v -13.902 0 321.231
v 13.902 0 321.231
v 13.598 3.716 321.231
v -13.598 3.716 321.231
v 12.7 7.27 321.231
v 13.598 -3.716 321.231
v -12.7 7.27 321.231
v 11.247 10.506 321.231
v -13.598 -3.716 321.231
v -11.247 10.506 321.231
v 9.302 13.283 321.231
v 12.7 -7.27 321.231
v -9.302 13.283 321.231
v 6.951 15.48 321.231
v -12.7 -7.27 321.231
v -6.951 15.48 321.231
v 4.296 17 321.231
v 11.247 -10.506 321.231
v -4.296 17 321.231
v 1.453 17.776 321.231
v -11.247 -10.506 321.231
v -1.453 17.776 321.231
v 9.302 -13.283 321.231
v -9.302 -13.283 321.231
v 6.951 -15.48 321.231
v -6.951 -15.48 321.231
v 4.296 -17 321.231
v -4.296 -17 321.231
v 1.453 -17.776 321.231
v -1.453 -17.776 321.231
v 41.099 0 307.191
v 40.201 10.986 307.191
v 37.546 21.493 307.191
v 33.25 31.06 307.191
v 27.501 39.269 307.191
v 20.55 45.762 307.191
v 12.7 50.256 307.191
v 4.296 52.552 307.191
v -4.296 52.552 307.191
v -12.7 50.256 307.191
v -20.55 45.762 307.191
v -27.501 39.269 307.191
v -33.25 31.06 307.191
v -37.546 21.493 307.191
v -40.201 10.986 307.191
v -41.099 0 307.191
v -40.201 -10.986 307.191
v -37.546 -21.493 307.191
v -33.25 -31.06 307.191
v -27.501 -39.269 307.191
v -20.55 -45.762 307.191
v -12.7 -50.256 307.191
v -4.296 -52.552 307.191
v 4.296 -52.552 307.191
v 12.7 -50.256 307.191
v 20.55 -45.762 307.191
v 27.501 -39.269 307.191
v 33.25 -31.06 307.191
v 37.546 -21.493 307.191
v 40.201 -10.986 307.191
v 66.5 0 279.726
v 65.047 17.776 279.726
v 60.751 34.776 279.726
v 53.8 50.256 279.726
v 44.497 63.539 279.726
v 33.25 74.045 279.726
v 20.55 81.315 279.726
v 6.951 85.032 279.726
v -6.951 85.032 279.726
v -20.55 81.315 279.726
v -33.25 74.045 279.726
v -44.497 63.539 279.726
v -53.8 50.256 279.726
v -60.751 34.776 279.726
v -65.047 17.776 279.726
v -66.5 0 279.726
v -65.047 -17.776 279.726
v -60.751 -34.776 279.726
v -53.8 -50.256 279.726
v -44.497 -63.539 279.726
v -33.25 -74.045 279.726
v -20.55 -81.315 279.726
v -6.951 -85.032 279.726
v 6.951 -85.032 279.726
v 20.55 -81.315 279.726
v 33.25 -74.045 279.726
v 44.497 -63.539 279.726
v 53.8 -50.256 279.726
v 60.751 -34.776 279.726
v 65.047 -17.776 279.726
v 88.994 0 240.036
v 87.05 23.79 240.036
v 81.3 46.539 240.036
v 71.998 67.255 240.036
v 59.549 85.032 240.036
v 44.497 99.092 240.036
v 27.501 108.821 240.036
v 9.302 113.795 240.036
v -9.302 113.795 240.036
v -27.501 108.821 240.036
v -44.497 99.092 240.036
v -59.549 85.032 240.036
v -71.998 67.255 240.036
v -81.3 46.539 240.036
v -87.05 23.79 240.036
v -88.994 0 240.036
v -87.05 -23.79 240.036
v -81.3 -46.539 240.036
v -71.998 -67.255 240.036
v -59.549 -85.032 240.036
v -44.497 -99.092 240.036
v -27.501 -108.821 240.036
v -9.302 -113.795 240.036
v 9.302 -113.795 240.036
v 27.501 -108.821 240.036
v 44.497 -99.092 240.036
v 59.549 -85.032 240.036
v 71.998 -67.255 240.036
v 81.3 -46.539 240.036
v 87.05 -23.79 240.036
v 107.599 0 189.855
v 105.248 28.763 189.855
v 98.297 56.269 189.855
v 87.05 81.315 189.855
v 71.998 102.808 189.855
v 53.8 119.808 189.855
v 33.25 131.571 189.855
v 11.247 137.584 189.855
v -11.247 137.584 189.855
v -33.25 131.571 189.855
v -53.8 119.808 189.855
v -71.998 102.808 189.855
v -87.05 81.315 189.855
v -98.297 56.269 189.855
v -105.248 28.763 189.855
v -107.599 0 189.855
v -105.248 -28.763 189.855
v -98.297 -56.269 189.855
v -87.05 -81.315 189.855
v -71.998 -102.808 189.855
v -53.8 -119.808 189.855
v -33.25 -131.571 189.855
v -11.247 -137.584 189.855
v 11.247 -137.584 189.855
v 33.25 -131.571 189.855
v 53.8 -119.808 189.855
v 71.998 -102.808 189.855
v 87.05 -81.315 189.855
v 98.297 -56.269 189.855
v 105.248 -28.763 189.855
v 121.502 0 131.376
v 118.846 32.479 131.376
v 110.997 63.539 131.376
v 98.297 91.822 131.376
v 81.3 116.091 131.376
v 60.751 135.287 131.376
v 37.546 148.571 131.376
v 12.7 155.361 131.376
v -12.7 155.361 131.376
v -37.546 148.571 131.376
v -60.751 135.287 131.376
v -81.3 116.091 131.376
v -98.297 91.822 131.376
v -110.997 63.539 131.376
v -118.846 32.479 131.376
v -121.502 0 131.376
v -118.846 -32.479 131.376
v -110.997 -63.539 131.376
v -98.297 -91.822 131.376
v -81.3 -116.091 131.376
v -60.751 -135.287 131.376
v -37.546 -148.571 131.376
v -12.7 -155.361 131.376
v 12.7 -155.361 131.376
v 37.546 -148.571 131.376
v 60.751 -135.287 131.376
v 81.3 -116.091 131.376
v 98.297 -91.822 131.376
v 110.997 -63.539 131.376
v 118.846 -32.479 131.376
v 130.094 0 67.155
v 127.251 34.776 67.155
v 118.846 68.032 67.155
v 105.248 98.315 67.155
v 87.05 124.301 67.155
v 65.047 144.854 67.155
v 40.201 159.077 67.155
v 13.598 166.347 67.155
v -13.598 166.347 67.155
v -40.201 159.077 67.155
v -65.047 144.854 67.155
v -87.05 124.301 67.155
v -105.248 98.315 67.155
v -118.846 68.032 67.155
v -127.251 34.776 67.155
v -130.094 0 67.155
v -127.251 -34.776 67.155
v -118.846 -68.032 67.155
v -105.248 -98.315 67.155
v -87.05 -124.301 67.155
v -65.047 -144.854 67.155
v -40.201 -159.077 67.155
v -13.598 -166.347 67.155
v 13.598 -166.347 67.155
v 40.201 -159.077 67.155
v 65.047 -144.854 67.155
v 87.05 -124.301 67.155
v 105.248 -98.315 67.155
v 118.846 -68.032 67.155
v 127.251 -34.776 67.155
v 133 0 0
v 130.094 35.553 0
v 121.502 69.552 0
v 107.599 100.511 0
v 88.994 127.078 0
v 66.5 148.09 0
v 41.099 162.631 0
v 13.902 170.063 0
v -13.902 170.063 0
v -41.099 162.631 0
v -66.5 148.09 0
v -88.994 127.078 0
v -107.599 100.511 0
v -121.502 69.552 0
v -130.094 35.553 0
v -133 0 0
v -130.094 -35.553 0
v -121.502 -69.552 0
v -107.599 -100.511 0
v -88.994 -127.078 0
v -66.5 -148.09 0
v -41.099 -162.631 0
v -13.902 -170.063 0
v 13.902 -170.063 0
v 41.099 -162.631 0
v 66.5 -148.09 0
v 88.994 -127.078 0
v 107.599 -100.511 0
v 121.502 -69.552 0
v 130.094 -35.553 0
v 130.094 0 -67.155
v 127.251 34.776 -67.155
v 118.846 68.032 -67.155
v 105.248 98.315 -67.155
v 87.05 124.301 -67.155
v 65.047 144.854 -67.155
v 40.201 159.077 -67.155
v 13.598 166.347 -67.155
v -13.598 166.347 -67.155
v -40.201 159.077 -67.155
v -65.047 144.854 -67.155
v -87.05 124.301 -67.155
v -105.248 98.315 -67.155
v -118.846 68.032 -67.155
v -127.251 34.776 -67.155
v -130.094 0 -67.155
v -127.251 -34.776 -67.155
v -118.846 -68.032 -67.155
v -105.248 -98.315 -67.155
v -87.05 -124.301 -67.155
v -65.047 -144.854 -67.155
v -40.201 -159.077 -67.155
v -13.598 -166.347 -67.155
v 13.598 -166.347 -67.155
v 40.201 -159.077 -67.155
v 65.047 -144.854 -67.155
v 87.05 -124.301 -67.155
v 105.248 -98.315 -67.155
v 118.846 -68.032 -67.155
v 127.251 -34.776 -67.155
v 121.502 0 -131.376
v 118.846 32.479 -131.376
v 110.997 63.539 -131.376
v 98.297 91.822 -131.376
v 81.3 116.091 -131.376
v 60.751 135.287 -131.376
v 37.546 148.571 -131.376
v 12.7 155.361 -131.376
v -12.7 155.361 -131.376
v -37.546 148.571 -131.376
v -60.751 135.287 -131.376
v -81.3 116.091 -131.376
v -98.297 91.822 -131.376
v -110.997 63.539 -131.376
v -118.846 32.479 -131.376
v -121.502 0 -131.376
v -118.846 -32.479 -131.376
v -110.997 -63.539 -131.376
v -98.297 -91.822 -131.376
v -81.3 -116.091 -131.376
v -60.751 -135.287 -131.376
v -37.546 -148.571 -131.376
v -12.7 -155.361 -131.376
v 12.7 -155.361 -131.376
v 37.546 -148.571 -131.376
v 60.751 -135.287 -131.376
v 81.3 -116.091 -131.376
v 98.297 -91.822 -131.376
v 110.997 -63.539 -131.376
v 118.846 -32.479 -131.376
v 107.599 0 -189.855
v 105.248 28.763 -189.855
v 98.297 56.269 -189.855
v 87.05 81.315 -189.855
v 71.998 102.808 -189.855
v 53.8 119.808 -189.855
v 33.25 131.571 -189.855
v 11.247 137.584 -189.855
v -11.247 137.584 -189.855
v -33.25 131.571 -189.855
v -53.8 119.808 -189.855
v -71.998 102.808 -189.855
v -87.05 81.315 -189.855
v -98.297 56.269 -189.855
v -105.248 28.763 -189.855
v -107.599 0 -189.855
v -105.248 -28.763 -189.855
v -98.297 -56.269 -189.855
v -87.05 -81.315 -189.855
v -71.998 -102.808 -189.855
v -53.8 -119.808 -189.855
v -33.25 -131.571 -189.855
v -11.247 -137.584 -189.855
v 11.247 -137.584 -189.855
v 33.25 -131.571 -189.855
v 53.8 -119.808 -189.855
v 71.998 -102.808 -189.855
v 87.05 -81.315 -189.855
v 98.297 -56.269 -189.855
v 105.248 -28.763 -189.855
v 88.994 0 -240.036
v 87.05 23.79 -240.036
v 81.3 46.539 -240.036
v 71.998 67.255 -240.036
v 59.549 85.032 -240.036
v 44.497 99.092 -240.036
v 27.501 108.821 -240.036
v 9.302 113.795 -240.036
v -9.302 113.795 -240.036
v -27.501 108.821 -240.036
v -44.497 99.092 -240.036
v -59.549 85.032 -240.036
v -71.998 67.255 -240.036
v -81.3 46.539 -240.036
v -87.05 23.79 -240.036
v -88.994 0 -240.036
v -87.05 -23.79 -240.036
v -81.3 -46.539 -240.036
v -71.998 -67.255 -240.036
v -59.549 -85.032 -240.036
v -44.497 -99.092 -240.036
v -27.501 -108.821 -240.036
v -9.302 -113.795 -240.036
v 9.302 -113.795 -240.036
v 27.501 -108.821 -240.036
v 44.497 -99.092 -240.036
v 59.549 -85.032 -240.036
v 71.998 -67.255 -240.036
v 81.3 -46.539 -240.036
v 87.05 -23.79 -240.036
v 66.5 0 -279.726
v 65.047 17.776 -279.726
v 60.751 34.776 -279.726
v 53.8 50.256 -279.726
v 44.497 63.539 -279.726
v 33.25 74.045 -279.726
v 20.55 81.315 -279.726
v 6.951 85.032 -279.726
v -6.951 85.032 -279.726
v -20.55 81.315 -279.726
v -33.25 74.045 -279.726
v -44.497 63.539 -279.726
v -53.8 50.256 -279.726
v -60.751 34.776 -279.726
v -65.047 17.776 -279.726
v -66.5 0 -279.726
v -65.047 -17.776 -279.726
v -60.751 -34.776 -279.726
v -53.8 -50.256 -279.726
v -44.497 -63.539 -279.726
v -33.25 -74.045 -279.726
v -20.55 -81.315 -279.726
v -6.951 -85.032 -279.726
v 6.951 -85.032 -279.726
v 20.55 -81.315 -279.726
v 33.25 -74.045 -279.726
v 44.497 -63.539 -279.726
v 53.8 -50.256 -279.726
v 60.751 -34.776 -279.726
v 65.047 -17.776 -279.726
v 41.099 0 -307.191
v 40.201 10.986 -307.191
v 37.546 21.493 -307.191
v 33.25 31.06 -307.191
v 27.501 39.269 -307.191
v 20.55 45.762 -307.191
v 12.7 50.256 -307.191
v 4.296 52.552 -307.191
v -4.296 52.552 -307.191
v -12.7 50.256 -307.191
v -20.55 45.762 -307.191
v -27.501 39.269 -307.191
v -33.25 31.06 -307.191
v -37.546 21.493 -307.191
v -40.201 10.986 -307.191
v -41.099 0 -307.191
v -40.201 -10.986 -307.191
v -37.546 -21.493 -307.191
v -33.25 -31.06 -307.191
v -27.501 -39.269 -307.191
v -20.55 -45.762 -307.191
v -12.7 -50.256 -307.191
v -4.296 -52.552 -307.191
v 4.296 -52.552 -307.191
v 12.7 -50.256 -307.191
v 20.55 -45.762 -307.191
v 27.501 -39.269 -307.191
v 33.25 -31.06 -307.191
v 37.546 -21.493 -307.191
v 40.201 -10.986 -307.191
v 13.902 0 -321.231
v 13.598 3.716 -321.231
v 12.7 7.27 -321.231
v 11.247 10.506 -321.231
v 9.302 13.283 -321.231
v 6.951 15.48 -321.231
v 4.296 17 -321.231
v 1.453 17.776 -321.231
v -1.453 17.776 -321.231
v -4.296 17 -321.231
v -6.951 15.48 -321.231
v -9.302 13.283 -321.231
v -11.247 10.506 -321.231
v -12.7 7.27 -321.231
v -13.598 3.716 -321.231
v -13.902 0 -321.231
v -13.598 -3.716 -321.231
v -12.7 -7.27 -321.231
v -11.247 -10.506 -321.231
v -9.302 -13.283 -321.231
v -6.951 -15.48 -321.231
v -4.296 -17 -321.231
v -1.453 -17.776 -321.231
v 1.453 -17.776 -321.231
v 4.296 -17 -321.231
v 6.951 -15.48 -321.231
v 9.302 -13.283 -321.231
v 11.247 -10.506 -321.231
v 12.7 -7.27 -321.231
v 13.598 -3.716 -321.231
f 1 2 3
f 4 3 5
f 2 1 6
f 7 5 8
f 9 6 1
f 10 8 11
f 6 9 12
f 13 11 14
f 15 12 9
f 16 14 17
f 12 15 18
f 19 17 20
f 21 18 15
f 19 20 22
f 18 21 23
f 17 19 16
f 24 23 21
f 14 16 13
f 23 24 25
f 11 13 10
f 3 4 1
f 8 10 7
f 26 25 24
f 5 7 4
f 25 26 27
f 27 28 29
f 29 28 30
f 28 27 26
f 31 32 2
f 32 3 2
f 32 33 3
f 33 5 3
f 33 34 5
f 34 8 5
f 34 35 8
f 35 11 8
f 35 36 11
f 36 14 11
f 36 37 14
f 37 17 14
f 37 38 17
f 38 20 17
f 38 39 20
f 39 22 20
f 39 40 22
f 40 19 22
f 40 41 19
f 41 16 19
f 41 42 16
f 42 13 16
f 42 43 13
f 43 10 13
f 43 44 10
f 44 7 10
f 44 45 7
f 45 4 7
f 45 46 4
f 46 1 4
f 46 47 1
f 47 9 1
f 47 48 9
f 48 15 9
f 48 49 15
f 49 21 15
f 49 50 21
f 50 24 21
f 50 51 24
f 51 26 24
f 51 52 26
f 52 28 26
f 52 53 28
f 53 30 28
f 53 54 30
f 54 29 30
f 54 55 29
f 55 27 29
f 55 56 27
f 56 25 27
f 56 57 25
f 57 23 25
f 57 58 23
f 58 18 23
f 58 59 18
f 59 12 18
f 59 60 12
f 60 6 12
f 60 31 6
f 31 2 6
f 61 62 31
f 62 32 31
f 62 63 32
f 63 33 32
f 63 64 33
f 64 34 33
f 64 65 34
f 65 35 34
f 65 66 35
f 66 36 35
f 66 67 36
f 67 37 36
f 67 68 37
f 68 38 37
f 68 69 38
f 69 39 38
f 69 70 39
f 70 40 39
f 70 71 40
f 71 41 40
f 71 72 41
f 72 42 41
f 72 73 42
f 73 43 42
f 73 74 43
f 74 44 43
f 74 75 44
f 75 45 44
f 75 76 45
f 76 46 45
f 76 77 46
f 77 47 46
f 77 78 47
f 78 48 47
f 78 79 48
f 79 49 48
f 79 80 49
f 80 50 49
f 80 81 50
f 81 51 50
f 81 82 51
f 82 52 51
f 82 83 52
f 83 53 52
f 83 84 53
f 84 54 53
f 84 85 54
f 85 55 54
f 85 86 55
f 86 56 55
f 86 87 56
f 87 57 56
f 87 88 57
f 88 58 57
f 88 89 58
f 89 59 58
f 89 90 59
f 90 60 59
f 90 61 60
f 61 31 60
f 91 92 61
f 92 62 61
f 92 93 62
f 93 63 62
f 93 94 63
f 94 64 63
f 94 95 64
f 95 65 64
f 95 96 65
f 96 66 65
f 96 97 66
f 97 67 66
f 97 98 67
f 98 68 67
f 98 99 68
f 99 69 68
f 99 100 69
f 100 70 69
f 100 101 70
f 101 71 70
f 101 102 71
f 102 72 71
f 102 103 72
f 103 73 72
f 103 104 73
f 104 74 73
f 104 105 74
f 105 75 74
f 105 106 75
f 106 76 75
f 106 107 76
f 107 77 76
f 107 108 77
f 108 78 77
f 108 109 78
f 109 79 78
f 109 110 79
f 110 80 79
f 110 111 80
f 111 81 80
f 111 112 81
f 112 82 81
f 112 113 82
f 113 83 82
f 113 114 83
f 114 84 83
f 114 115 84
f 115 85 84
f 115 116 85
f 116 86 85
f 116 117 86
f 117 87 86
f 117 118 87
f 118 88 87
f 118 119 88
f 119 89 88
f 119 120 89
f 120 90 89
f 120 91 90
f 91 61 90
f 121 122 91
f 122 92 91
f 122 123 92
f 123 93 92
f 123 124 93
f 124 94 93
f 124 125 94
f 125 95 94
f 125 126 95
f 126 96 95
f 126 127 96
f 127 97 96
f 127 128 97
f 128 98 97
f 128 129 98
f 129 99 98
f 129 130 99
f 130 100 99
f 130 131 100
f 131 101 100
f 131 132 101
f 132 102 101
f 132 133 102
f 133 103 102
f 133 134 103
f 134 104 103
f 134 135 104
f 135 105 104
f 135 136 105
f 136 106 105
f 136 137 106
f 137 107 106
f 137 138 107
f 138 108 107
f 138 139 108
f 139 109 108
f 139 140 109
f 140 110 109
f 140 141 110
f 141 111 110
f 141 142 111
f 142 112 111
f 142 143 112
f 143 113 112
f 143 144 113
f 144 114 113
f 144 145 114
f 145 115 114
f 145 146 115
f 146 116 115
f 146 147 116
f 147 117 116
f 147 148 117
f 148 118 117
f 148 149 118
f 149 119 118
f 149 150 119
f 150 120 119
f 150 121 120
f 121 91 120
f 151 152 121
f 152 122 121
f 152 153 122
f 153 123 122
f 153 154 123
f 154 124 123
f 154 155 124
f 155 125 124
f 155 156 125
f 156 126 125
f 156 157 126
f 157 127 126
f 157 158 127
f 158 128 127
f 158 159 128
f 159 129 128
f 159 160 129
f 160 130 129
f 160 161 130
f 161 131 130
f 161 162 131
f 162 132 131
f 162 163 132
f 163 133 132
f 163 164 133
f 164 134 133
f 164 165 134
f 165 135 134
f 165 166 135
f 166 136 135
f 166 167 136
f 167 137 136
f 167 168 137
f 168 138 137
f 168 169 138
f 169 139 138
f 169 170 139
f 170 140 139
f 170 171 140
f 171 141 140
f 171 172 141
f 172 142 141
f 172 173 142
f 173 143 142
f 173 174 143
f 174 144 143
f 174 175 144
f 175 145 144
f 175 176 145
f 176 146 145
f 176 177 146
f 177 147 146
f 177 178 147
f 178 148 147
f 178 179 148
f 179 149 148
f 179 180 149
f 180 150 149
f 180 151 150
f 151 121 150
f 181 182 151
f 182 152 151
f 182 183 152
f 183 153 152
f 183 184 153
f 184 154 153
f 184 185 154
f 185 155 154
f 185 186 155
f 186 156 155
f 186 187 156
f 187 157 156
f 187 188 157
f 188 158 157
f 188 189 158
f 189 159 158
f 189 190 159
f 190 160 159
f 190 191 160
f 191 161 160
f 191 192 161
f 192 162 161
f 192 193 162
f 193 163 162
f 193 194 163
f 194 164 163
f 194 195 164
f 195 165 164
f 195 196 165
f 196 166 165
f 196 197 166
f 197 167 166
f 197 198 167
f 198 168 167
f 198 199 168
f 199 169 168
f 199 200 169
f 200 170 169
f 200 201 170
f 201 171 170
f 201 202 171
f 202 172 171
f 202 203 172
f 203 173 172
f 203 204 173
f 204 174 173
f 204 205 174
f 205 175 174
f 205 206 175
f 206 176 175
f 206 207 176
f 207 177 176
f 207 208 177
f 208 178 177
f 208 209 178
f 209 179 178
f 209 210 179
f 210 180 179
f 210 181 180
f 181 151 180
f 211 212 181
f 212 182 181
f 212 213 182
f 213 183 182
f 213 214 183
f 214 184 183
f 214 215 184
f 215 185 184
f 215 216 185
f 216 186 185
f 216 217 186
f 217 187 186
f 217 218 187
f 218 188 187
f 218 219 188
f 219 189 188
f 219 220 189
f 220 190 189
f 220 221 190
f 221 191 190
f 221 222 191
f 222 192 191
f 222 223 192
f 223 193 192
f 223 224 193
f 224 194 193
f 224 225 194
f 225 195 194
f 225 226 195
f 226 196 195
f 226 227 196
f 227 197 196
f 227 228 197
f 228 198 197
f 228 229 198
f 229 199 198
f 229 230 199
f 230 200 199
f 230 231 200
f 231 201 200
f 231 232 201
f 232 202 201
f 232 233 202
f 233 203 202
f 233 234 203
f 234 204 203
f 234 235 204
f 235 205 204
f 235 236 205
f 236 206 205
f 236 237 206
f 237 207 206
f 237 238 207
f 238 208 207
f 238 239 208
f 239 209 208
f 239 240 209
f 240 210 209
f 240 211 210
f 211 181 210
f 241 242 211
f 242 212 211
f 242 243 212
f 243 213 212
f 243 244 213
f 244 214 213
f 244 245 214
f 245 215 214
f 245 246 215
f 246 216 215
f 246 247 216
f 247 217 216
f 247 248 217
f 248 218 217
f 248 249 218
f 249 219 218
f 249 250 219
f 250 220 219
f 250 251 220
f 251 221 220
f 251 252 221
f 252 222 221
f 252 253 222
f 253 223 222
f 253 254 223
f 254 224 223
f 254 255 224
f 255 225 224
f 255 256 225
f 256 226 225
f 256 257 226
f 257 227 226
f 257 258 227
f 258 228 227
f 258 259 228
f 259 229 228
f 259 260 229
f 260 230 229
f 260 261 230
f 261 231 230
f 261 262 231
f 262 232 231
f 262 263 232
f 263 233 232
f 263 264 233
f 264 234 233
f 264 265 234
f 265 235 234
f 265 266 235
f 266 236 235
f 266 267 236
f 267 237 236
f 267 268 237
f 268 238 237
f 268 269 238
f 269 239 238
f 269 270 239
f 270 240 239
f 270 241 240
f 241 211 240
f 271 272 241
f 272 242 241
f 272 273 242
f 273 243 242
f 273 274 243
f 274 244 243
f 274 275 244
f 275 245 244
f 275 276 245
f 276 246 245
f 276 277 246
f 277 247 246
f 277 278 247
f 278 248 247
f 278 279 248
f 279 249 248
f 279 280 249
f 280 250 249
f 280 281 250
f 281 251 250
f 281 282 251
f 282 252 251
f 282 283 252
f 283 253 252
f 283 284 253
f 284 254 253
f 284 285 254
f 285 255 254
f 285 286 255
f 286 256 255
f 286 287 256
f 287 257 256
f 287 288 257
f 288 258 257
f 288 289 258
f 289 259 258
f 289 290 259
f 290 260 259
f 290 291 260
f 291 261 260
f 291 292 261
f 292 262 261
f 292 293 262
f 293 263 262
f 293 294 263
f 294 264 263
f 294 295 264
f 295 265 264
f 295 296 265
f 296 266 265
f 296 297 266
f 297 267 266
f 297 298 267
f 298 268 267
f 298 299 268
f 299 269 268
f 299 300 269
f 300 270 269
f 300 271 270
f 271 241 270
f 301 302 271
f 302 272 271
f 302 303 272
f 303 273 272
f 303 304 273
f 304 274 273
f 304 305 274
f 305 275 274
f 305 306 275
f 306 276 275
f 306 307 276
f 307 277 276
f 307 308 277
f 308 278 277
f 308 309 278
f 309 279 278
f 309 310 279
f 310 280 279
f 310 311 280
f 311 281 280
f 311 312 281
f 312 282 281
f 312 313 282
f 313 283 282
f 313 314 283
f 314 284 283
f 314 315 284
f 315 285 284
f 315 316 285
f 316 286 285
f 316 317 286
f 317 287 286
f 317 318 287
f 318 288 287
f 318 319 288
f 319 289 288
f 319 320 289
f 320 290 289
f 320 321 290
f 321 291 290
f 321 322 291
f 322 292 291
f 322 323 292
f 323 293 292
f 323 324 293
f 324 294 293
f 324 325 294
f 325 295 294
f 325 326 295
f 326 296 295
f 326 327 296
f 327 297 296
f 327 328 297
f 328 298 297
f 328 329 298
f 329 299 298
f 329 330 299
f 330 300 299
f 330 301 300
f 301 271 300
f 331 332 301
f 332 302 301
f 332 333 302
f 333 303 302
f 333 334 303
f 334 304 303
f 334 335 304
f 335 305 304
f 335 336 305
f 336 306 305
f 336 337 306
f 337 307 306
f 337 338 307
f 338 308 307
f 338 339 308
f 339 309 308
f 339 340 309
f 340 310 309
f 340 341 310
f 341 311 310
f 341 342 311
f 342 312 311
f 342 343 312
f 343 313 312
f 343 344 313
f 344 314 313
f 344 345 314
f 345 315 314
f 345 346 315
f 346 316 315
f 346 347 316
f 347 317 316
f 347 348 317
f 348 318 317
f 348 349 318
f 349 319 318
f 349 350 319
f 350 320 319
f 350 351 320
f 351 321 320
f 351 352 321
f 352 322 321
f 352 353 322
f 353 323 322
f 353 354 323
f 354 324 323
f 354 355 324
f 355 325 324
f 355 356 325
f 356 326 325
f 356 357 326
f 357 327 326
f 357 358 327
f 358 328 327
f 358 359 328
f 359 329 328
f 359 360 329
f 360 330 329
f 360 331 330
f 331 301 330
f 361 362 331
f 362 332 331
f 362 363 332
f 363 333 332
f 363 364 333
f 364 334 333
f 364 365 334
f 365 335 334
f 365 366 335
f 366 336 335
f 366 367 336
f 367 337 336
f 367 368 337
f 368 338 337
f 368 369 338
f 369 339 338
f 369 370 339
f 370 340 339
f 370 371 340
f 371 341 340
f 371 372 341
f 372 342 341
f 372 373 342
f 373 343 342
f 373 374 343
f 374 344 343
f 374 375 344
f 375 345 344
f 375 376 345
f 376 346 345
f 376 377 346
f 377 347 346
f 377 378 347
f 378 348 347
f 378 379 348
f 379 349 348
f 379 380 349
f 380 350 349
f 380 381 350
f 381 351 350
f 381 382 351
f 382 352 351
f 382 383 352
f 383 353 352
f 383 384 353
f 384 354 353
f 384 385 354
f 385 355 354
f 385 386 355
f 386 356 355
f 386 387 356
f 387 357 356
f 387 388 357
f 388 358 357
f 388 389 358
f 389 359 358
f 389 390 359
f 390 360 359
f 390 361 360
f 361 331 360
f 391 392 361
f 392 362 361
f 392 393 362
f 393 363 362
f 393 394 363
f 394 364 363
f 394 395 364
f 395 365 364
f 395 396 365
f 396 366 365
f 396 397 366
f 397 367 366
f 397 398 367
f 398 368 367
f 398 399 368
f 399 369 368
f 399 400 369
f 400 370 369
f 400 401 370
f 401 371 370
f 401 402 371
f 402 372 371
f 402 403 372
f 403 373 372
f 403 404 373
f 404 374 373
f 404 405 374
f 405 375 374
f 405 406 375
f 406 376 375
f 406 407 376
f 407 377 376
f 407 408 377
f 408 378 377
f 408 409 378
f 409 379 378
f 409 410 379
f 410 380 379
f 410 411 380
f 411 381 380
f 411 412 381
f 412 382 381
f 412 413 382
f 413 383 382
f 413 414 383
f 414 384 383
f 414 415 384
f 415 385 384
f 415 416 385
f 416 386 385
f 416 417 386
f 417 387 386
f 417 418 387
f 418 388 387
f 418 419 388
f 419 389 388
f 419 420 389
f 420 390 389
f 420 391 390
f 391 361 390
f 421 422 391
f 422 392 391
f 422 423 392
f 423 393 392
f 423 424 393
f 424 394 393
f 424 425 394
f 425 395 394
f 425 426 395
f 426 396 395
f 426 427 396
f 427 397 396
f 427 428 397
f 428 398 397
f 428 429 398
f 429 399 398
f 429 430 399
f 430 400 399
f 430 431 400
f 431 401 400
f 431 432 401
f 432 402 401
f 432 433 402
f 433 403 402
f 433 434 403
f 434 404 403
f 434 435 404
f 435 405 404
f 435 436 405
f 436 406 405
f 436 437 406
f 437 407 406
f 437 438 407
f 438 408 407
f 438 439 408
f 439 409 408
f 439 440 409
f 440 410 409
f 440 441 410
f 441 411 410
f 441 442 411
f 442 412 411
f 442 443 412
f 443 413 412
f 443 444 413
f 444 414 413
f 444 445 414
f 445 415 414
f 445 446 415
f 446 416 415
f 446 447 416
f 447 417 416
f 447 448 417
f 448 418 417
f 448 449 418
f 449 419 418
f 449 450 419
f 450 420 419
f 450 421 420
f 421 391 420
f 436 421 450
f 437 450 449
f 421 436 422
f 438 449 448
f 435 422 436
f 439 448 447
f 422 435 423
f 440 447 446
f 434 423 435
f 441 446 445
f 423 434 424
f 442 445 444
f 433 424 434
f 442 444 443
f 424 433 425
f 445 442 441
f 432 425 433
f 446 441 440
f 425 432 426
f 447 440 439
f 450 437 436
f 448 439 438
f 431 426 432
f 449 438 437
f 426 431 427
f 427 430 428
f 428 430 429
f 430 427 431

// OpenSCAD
// Generated by SolidPython 1.0.1 on 2020-07-29 00:46:47


scale(v = [7, 9, 17]) {
	sphere(r = 19);
}
/***********************************************
*********      SolidPython code:      **********
************************************************
 
# import packages: SolidPython
from solid import *
from solid.utils import *
from itertools import chain, combinations, permutations


class Resize:

    def __init__(self, scad_file):
        self.scad_file = scad_file
        #self.scad_file = import_scad(scad_file)
        # cone/cylinder param:
        self.r1 = 0
        self.r2 = 0
        self.h = 0
        # rectangular prism param:
        self.w = 0
        self.l = 0
        # ellipse param:
        self.r = 0

    # import OpenScad code (file name corresponds to shape)


    # classify shape + parameters
    def assign(self, param1, param2, param3):
        if self.scad_file == 'cone.scad':
            self.r1 = param1
            self.r2 = param2
            self.h = param3
        elif self.scad_file == 'cylinder.scad':
            self.r1 = param1
            self.r2 = param2
            self.h = param3
        elif self.scad_file == 'rectangularPrism.scad':
            self.h = param1
            self.l = param2
            self.w = param3
        else:
            self.r = param1
            self.h = param2

    # resize parameters
    def iterate(self):
        x = range(3, 20, 2)
        i = 1
        if self.scad_file == 'cone.scad':
            tempList = list(permutations(x, 2))
            for temp in tempList:
                param1 = temp[0]
                param2 = temp[1]
                filepath = 'produced_scad_files/' + 'cone' + str(param1) + '_' + str(param2) + '_' + '.scad'
                scad_render_to_file(cylinder(h=param1, r1=param2, r2=0), filepath)

        elif self.scad_file == 'cylinder.scad':
            tempList = list(permutations(x, 3))
            for temp in tempList:
                param1 = temp[0]
                param2 = temp[1]
                filepath = 'produced_scad_files/' + 'cylinder' + str(param1) + '_' + str(param2) + '_' + '.scad'
                scad_render_to_file(cylinder(h=param1, r1=param2, r2=param2), filepath)

        elif self.scad_file == 'rectangularPrism.scad':
            tempList = list(permutations(x, 3))
            for temp in tempList:
                param1 = temp[0]
                param2 = temp[1]
                param3 = temp[2]
                filepath = 'produced_scad_files/' + 'rectangularPrism' + str(param1) + '_' + str(param2) + '_' + str(
                    param3) + '.scad'
                scad_render_to_file(cube(size=(param1, param2, param3)), filepath)

        elif self.scad_file == 'ellipse.scad':
            tempList = list(permutations(x, 4))
            for temp in tempList:
                param1 = temp[0]
                param2 = temp[1]
                param3 = temp[2]
                param4 = temp[3]
                filepath = 'produced_scad_files/' + 'ellipse' + str(param1) + '_' + str(param2) + '_' + str(param3) + '_' + str(param4) + '.scad'
                scad_render_to_file(scale([param1, param2, param3])(sphere(r=param4)), filepath)

    def render_to_scadfile(self):
        scad_render_to_file(scad, 'example.scad') 
 
************************************************/
